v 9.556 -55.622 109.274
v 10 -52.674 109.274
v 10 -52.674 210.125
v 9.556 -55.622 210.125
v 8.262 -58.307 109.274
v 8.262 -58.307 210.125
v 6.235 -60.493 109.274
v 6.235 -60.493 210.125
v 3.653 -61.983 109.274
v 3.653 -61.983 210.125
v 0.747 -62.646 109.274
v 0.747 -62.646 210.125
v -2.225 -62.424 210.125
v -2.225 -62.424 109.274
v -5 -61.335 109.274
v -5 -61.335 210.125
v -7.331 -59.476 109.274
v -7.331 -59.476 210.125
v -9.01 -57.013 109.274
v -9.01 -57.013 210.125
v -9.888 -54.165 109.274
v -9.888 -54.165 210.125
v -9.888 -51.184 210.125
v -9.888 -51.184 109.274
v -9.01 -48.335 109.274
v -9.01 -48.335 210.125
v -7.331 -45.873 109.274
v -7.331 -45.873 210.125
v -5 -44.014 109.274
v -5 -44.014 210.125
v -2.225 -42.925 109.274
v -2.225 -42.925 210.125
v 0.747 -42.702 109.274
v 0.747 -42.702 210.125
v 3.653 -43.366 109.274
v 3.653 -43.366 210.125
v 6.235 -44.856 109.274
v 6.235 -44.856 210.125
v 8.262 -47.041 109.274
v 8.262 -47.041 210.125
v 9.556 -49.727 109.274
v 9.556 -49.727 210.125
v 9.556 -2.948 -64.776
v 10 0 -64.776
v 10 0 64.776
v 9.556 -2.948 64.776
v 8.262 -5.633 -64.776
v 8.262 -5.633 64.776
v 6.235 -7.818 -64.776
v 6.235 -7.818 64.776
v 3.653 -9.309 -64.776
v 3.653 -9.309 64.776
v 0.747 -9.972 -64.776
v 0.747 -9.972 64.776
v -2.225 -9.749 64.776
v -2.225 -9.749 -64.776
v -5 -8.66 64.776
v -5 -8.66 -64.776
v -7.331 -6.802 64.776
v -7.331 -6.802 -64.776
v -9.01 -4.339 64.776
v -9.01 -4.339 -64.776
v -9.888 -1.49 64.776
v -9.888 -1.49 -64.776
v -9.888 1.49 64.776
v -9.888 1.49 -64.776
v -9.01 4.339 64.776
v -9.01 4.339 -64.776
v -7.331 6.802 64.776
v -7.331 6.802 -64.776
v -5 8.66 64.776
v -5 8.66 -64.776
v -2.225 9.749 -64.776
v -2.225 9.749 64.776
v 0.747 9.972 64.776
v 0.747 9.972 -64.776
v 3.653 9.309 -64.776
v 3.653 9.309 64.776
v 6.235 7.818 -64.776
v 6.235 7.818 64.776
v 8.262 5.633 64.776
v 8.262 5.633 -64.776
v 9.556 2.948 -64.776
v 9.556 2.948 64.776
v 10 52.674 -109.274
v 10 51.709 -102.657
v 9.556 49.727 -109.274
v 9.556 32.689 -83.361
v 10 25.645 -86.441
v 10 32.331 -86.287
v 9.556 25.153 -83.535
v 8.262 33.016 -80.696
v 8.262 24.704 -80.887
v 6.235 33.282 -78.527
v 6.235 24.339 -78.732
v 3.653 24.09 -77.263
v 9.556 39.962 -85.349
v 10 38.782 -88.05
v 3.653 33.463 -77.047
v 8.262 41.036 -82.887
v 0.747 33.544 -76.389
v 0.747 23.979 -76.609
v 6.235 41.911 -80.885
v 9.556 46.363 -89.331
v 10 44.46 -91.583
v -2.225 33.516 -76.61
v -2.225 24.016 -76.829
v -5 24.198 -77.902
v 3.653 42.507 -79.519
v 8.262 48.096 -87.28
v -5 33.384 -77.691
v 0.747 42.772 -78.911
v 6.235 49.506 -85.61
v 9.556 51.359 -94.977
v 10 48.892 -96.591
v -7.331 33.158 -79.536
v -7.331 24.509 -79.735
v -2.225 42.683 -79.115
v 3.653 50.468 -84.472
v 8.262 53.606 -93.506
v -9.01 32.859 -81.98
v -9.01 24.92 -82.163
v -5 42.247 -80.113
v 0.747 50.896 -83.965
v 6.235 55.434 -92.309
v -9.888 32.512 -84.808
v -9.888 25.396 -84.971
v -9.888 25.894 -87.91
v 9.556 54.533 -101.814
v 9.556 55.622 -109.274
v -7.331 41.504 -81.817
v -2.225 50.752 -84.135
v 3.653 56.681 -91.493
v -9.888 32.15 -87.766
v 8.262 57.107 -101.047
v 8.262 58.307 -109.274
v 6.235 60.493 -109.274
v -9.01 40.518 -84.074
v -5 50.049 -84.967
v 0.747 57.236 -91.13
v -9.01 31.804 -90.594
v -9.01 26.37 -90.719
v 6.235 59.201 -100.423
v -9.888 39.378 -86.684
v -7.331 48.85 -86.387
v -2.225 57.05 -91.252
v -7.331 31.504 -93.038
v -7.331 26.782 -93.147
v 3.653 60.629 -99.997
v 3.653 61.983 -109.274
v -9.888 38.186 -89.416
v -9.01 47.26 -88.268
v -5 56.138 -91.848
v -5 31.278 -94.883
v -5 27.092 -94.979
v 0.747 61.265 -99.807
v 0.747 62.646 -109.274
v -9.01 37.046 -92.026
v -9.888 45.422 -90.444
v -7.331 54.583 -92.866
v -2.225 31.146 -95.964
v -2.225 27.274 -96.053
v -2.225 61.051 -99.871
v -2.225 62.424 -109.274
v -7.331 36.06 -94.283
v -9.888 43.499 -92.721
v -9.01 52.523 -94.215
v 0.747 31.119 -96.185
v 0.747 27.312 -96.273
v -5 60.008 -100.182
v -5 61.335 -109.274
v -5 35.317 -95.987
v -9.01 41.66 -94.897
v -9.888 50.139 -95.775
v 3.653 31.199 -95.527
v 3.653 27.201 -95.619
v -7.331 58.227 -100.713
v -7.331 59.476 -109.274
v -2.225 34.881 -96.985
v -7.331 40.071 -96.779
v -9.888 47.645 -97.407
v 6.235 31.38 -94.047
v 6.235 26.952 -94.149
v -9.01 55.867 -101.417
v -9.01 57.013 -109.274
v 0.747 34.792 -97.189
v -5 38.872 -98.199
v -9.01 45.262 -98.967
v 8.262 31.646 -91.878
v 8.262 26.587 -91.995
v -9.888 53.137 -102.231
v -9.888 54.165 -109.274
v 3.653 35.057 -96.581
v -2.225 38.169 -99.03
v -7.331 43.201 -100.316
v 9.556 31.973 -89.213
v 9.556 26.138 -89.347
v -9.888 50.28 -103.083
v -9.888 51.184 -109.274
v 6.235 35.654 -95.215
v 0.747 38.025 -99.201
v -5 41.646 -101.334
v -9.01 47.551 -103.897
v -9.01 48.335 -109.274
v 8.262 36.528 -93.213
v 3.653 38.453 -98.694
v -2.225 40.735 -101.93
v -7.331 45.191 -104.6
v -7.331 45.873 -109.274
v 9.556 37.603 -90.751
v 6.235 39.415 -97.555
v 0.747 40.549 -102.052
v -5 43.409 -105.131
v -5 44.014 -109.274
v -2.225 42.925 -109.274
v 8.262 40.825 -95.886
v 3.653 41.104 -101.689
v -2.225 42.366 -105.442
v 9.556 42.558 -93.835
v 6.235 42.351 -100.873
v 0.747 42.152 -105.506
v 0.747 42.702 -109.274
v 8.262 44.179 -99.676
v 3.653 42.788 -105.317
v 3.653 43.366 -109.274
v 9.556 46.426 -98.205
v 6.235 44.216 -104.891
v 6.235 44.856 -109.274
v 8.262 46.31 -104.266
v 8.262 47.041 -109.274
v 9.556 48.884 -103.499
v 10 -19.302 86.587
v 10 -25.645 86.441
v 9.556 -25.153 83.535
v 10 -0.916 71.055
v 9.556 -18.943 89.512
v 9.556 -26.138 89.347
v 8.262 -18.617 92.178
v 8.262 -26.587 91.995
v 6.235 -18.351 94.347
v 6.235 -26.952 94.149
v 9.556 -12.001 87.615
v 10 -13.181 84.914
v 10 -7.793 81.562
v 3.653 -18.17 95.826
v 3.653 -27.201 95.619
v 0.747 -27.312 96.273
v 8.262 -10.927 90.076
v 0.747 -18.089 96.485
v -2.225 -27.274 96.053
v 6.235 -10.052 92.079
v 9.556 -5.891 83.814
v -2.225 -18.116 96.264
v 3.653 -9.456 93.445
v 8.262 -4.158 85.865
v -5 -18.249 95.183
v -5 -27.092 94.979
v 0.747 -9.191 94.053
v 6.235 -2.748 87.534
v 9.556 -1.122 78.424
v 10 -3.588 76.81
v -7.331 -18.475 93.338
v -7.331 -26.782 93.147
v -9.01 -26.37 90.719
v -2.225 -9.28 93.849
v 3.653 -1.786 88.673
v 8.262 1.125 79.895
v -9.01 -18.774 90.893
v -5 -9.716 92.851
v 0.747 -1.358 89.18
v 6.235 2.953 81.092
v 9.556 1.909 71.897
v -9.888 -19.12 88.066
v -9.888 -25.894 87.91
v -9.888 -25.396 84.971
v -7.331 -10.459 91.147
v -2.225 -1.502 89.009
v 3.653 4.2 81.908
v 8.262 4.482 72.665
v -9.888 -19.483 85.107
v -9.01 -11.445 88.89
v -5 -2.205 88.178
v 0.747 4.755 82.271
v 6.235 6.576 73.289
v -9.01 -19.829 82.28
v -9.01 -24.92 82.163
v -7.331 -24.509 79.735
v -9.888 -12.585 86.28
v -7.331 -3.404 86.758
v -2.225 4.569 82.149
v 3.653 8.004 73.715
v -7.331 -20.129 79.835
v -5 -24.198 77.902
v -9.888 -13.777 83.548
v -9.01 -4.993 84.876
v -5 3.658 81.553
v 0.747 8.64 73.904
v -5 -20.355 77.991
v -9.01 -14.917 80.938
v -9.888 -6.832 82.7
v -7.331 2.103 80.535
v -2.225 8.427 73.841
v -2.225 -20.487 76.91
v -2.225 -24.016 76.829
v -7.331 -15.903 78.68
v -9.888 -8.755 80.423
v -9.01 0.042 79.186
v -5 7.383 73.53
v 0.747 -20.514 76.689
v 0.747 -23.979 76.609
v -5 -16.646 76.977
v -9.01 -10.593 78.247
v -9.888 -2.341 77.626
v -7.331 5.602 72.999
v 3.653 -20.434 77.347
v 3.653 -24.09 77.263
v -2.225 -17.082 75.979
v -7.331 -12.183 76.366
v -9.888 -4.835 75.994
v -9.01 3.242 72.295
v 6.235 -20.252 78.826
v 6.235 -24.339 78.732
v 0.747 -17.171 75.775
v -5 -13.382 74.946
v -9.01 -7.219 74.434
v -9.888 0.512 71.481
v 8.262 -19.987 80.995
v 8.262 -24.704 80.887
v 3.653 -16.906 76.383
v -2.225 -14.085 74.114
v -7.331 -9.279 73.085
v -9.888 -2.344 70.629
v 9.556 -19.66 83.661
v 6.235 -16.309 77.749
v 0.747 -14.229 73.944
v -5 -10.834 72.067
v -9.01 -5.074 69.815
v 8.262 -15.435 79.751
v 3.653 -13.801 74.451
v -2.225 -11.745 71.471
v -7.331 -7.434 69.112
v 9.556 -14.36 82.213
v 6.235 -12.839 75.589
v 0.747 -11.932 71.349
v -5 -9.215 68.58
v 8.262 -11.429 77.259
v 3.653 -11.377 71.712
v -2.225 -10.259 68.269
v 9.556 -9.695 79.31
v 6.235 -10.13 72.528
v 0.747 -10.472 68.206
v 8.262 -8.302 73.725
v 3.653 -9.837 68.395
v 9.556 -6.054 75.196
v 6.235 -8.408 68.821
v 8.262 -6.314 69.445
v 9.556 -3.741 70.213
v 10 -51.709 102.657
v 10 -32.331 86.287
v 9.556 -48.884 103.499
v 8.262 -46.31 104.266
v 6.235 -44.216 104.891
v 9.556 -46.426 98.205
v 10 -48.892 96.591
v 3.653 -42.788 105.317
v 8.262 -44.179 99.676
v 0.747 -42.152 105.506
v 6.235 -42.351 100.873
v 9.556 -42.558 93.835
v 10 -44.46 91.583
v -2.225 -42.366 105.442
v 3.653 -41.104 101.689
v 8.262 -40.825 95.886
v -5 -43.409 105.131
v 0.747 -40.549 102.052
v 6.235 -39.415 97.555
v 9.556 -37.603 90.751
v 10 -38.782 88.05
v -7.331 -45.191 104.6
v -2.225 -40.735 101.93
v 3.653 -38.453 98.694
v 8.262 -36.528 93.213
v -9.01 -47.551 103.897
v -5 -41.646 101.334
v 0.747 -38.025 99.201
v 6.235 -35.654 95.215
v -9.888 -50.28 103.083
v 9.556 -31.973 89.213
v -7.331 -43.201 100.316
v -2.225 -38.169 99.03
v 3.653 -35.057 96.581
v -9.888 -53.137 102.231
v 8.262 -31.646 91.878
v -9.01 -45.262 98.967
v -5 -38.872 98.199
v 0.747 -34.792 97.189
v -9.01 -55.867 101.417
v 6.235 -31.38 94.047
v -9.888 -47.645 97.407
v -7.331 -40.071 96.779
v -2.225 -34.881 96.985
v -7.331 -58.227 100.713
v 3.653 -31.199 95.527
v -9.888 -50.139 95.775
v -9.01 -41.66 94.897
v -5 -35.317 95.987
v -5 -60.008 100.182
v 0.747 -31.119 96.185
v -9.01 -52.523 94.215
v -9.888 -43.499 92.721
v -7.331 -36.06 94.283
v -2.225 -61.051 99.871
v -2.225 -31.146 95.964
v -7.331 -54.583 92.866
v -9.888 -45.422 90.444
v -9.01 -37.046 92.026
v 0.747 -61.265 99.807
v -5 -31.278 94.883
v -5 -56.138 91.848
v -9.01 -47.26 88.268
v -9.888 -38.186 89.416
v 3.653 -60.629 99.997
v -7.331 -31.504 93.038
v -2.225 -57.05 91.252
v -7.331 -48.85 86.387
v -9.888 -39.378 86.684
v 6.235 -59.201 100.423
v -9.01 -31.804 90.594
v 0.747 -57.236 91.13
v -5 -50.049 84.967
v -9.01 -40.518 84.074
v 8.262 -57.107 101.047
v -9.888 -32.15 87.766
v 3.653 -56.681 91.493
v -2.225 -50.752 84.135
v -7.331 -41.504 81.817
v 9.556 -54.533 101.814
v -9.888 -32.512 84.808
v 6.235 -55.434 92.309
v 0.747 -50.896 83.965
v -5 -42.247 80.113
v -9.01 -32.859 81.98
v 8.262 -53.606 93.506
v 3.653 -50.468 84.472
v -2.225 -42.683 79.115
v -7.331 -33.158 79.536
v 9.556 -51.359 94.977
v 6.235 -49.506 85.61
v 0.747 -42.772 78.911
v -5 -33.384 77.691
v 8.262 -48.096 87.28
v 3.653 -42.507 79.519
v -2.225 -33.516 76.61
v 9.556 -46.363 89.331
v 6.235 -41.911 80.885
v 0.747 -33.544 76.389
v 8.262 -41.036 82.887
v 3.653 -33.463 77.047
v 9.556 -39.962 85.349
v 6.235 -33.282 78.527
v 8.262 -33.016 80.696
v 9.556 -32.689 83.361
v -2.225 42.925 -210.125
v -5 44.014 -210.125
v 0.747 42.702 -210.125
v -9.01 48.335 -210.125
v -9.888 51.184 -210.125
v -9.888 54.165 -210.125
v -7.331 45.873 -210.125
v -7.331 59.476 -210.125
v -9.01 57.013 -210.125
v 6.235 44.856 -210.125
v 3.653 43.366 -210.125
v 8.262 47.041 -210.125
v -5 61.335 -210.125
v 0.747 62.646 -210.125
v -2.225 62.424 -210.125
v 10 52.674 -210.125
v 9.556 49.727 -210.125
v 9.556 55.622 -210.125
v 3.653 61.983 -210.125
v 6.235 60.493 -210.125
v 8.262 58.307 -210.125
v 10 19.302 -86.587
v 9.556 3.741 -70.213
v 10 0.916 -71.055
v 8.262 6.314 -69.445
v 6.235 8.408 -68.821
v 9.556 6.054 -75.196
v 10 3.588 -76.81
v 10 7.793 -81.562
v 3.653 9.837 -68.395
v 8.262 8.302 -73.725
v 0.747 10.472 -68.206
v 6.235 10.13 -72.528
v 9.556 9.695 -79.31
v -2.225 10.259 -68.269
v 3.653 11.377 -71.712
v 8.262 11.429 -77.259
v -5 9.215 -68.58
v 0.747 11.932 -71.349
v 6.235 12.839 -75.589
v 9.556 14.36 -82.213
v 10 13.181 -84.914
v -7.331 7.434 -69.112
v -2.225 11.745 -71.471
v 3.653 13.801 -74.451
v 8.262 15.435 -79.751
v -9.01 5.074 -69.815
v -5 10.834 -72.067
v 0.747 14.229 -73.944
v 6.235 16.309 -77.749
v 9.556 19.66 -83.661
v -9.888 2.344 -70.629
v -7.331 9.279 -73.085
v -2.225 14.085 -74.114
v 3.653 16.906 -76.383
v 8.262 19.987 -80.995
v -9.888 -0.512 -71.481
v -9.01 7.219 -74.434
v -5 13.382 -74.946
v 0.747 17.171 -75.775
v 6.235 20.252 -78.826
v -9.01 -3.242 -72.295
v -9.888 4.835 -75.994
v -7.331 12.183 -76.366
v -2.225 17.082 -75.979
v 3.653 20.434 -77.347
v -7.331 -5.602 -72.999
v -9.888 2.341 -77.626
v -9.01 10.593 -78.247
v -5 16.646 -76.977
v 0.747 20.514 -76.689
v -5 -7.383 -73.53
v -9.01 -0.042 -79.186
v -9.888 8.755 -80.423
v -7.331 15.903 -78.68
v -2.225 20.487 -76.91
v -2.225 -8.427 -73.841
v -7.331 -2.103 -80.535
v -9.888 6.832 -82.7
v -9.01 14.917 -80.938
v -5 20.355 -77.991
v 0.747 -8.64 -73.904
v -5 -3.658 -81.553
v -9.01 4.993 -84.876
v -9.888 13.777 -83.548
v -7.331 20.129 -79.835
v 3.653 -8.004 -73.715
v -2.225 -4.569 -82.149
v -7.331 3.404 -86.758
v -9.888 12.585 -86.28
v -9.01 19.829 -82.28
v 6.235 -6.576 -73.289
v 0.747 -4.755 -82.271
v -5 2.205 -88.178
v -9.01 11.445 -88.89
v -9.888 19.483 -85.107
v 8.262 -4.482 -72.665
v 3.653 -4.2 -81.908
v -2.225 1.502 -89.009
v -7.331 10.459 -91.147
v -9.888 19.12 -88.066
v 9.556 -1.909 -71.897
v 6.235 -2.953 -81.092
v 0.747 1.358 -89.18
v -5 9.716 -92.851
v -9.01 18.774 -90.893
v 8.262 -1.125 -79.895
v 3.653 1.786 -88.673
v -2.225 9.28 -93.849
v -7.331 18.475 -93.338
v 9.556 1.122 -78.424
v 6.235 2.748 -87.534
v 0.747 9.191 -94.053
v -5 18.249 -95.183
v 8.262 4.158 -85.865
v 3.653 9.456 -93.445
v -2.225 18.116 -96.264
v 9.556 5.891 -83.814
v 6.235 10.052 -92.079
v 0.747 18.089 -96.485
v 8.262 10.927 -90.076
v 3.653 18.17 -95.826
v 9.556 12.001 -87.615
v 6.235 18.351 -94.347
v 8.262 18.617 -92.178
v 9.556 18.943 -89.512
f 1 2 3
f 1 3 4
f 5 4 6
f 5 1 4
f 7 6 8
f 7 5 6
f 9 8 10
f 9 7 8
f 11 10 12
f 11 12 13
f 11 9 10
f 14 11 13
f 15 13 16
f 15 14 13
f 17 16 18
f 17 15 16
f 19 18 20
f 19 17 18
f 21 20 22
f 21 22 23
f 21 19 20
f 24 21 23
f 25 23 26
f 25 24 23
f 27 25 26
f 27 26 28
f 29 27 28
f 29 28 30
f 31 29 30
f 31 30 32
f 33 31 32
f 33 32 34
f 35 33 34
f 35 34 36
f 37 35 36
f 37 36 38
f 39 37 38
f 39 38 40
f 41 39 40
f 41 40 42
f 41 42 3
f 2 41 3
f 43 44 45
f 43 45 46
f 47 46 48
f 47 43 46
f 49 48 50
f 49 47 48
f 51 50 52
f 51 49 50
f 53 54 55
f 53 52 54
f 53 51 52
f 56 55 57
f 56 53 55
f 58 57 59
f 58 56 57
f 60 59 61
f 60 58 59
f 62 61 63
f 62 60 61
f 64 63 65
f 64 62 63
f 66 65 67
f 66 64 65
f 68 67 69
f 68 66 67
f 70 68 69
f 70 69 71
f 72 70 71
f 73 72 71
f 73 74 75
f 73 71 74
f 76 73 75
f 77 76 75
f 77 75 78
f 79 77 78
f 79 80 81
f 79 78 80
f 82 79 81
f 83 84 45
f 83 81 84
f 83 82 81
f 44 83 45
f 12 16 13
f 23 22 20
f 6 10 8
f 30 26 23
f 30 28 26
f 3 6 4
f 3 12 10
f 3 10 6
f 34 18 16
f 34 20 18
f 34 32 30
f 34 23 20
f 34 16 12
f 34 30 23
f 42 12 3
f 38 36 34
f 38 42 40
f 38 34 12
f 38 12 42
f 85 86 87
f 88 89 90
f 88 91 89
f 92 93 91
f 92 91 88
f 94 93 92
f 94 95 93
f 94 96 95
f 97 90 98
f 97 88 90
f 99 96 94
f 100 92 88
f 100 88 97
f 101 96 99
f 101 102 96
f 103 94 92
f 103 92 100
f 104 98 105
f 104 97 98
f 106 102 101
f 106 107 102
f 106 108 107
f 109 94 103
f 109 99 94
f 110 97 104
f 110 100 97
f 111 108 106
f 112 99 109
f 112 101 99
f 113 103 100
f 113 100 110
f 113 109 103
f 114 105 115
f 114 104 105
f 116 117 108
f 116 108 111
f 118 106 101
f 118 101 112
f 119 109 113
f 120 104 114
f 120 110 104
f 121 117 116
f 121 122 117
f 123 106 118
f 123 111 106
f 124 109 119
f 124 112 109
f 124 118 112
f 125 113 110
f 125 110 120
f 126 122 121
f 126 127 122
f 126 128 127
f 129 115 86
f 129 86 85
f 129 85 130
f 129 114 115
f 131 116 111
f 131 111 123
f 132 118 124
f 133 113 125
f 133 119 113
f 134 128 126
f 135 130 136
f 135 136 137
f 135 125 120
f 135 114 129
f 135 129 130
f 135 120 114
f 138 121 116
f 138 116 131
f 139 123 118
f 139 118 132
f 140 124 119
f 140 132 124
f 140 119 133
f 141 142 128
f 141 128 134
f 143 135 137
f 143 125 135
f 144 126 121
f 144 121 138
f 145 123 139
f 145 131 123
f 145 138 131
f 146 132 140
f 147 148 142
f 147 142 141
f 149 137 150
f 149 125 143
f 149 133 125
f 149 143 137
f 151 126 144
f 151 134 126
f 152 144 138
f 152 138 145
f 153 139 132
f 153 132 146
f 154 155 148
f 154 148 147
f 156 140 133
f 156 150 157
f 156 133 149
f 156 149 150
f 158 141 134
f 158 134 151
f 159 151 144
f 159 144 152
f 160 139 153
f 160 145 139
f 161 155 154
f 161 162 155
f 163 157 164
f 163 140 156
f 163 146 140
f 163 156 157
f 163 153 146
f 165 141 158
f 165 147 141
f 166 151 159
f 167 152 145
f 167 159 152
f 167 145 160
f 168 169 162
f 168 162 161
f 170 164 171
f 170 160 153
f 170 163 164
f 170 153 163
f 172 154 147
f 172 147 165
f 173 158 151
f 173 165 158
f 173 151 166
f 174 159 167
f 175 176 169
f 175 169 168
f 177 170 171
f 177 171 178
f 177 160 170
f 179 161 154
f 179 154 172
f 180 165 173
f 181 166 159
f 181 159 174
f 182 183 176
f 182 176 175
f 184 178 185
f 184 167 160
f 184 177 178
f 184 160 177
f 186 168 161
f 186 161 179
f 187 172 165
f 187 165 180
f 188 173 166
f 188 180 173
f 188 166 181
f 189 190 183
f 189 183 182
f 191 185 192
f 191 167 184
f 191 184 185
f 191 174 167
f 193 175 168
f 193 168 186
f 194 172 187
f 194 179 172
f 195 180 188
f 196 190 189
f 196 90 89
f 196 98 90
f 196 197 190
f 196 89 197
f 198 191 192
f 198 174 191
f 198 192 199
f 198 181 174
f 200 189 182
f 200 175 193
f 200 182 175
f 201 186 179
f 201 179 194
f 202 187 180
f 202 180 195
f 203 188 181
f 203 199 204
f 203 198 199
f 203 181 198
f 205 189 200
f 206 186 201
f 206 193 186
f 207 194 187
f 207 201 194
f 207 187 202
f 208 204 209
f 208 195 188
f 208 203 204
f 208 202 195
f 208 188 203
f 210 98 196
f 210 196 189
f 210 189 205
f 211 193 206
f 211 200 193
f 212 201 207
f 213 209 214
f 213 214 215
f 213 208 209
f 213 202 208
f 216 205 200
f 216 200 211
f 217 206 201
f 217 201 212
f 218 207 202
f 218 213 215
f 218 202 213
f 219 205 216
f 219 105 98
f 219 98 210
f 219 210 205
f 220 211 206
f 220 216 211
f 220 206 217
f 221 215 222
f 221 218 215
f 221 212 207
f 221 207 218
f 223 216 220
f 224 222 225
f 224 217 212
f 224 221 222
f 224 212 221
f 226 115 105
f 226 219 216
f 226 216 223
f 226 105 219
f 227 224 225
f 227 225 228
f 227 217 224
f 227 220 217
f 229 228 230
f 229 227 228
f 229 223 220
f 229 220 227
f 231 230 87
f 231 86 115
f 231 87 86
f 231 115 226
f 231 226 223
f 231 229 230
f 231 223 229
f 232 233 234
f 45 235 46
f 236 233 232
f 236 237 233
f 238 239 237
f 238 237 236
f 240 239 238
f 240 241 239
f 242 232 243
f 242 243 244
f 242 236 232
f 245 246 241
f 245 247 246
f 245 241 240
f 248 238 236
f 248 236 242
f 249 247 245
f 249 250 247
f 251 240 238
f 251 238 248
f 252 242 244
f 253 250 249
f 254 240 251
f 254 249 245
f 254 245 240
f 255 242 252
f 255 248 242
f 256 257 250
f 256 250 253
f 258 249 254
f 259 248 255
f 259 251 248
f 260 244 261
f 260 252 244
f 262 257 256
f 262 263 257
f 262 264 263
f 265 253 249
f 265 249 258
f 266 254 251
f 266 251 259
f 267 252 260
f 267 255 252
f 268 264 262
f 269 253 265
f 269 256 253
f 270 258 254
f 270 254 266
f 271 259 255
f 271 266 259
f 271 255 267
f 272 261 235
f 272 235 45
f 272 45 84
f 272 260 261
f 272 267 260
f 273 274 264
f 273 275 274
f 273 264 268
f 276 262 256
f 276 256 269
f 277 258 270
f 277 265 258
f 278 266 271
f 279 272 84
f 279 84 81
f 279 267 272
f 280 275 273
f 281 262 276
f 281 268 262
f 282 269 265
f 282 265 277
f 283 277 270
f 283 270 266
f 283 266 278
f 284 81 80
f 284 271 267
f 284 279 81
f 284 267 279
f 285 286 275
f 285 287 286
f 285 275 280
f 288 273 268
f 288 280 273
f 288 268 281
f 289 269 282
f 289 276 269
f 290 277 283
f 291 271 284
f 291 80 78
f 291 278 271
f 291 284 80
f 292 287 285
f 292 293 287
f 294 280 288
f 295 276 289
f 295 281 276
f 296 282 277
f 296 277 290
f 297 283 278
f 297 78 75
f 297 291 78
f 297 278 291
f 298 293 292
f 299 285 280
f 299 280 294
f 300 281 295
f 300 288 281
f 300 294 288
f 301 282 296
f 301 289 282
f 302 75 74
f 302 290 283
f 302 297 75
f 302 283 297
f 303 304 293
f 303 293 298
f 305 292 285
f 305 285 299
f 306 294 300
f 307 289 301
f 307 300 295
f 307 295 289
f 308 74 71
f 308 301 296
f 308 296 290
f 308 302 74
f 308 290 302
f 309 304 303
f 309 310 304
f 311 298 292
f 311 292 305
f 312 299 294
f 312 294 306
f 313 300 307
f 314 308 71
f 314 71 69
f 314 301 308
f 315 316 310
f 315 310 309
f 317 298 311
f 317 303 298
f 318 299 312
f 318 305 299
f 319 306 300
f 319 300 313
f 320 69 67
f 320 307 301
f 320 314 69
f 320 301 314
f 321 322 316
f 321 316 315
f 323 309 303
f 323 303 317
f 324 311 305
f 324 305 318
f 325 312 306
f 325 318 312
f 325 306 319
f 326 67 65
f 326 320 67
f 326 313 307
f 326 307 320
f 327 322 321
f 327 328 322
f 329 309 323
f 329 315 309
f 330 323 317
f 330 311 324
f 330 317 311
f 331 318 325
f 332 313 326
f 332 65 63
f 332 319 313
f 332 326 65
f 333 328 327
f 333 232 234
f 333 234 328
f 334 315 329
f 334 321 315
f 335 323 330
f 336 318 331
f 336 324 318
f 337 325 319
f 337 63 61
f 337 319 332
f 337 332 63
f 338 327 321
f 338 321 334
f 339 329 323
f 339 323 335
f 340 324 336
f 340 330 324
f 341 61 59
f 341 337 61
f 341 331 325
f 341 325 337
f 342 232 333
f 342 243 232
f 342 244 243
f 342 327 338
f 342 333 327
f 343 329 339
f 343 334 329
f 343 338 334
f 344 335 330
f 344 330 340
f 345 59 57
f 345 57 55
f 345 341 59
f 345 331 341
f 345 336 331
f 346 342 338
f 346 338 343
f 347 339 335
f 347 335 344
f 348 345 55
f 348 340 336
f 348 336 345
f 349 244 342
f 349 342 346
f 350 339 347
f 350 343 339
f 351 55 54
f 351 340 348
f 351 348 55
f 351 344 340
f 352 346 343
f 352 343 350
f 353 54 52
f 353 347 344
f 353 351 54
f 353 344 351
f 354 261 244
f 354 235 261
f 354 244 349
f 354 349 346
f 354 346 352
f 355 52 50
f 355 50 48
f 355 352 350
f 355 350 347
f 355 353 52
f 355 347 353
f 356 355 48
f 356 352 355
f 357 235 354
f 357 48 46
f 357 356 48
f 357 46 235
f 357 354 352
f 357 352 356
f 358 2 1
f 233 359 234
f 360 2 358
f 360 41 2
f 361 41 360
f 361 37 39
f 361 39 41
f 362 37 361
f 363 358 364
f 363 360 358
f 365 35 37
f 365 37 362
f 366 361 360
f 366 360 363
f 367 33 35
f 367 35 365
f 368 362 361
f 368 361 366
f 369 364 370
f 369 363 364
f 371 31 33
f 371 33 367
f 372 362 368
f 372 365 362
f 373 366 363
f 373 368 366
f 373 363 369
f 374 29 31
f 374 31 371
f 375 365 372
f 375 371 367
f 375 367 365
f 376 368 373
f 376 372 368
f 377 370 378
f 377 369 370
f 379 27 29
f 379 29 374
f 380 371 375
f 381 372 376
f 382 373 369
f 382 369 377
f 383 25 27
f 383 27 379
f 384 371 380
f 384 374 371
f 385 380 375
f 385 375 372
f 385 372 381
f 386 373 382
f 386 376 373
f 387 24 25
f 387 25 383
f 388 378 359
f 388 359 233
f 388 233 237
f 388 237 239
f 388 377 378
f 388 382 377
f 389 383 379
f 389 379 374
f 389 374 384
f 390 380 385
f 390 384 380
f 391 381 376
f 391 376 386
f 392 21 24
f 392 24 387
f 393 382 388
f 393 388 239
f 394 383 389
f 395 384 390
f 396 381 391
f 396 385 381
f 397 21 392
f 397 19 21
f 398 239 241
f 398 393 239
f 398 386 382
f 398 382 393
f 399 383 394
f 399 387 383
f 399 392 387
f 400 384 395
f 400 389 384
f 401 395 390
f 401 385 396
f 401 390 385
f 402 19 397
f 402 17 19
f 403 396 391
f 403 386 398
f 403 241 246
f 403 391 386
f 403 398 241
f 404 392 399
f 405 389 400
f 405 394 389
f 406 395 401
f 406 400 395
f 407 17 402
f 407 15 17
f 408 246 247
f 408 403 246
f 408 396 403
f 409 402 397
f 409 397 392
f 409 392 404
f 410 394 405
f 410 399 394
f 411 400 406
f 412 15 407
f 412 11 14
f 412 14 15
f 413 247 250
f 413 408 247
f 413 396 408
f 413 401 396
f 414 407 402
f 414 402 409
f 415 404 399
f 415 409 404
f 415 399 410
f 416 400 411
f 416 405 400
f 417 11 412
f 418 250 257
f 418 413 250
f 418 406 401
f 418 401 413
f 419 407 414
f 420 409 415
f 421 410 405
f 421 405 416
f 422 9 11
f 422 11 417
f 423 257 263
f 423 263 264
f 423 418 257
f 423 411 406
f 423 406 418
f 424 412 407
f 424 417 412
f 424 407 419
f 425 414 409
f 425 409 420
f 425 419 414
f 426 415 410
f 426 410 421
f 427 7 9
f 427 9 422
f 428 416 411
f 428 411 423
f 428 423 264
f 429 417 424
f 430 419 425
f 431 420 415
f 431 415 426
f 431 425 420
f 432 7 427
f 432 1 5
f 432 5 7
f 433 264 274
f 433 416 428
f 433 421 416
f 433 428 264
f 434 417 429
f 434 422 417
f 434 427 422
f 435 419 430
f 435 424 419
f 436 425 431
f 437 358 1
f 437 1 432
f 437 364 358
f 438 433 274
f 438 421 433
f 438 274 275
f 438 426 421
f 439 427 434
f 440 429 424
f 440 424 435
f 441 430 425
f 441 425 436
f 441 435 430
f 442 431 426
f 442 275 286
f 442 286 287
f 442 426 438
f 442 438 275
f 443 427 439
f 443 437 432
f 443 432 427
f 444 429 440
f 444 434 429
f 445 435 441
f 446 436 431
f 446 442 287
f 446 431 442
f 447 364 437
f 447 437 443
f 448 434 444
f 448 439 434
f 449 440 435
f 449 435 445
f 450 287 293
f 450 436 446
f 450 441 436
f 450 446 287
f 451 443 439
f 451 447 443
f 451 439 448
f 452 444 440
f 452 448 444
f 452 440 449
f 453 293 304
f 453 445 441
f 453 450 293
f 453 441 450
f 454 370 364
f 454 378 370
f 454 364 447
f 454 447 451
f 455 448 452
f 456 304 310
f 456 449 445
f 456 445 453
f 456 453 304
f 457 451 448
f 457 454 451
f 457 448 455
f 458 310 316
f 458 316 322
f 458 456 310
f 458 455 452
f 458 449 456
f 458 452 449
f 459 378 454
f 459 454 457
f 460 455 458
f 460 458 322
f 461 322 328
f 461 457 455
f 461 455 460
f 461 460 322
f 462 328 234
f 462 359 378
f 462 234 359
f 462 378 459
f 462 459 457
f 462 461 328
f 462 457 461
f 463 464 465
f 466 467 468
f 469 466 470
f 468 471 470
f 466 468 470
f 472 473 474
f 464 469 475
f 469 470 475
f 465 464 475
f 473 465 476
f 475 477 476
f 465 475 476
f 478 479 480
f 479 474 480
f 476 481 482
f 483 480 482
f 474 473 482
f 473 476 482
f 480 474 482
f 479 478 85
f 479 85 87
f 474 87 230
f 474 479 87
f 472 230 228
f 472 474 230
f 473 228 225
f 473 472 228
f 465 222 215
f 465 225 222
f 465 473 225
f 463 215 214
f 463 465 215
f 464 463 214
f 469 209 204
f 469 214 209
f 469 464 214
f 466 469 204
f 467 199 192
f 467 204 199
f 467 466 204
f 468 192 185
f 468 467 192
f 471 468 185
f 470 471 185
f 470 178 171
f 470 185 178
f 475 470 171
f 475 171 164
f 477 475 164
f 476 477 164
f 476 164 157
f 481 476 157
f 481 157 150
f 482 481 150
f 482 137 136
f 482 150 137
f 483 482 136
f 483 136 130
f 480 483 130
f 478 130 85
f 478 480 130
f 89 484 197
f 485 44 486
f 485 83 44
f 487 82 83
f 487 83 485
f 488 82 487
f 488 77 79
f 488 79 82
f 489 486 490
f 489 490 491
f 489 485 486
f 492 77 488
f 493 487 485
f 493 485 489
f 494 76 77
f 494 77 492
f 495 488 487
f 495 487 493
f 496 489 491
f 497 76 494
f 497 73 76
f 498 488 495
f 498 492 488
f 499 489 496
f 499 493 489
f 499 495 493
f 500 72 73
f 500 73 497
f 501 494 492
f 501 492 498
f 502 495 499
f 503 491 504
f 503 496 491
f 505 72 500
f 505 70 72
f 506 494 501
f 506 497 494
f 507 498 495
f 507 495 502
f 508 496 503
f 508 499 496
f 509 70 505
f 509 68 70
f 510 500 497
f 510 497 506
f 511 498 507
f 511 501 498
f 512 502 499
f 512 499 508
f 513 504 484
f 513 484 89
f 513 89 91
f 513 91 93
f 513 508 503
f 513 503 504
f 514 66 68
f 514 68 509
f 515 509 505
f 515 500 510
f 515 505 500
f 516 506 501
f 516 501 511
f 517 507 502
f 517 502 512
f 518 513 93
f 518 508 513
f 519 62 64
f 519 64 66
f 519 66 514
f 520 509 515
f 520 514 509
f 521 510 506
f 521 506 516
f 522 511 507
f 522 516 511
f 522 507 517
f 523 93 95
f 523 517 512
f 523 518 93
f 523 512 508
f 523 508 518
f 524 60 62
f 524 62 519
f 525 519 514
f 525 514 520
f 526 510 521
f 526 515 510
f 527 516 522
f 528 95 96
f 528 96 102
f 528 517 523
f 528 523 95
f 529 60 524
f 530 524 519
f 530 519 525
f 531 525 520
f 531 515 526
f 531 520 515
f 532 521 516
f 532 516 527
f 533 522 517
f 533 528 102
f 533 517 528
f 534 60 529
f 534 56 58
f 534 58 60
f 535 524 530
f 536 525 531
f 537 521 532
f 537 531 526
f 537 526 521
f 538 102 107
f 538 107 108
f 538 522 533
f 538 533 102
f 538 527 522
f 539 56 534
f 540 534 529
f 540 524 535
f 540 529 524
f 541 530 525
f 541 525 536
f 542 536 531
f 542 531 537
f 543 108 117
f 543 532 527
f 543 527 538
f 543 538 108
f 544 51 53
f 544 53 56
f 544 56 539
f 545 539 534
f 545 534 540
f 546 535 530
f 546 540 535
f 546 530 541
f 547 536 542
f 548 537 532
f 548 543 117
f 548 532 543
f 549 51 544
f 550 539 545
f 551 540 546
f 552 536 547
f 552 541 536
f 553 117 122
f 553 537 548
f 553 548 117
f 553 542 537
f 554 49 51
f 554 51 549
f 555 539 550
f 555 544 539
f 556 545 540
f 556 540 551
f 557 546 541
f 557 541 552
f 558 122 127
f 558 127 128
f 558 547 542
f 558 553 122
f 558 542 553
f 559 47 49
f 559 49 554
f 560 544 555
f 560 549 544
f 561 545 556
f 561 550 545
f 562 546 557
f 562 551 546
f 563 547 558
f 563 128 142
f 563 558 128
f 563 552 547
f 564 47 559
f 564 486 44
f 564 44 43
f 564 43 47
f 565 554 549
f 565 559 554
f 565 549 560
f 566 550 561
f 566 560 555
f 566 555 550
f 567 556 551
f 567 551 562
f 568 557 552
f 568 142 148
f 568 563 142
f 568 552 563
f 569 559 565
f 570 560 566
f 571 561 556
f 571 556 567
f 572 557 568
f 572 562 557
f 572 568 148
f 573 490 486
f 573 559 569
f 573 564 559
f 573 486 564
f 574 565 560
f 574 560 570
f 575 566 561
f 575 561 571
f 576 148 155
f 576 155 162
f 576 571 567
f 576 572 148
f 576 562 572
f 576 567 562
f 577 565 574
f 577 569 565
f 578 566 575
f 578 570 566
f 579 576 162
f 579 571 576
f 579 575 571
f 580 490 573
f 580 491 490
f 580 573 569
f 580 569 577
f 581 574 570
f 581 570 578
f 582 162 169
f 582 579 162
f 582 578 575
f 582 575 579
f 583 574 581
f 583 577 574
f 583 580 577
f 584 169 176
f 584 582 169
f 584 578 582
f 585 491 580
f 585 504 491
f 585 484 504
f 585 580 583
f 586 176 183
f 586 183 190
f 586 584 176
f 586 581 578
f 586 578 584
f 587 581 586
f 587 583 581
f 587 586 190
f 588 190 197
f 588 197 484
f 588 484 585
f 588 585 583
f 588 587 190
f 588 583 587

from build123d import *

# Parameters (mm, degrees)
SKETCH3_R = 10


with BuildPart() as part:
    # Sweep2: sweep along a path in Sketch1
    with BuildLine(Plane(origin=(0, 0, 0), x_dir=(0, 0, -1), z_dir=(1, 0, 0))) as sweep2_path:
        Line((-210.124764734, -52.674246303), (-160.124764734, -52.674246303))
        Line((-160.124764734, -52.674246303), (-109.274248541, -52.674246303))
        ThreePointArc((-109.274248541, -52.674246303), (-91.582896902, -44.460377319), (-86.440777952, -25.64521909))
        ThreePointArc((-86.440777952, -25.64521909), (-81.561920639, -7.793342617), (-64.776315105, 0))
        Line((-64.776315105, 0), (64.776315105, 0))
        ThreePointArc((64.776315105, 0), (81.561920639, 7.793342617), (86.440777952, 25.64521909))
        ThreePointArc((86.440777952, 25.64521909), (91.582896902, 44.460377319), (109.274248541, 52.674246303))
        Line((109.274248541, 52.674246303), (160.124764734, 52.674246303))
        Line((160.124764734, 52.674246303), (210.124764734, 52.674246303))
    # Sketch3 → Sweep2 (sweep)
    with BuildSketch(Plane(origin=(0, -52.674246303, 210.124764734), x_dir=(1, 0, 0), z_dir=(0, 0, 1))):
        Circle(SKETCH3_R)
    sweep(path=sweep2_path.line)


solid = part.part
